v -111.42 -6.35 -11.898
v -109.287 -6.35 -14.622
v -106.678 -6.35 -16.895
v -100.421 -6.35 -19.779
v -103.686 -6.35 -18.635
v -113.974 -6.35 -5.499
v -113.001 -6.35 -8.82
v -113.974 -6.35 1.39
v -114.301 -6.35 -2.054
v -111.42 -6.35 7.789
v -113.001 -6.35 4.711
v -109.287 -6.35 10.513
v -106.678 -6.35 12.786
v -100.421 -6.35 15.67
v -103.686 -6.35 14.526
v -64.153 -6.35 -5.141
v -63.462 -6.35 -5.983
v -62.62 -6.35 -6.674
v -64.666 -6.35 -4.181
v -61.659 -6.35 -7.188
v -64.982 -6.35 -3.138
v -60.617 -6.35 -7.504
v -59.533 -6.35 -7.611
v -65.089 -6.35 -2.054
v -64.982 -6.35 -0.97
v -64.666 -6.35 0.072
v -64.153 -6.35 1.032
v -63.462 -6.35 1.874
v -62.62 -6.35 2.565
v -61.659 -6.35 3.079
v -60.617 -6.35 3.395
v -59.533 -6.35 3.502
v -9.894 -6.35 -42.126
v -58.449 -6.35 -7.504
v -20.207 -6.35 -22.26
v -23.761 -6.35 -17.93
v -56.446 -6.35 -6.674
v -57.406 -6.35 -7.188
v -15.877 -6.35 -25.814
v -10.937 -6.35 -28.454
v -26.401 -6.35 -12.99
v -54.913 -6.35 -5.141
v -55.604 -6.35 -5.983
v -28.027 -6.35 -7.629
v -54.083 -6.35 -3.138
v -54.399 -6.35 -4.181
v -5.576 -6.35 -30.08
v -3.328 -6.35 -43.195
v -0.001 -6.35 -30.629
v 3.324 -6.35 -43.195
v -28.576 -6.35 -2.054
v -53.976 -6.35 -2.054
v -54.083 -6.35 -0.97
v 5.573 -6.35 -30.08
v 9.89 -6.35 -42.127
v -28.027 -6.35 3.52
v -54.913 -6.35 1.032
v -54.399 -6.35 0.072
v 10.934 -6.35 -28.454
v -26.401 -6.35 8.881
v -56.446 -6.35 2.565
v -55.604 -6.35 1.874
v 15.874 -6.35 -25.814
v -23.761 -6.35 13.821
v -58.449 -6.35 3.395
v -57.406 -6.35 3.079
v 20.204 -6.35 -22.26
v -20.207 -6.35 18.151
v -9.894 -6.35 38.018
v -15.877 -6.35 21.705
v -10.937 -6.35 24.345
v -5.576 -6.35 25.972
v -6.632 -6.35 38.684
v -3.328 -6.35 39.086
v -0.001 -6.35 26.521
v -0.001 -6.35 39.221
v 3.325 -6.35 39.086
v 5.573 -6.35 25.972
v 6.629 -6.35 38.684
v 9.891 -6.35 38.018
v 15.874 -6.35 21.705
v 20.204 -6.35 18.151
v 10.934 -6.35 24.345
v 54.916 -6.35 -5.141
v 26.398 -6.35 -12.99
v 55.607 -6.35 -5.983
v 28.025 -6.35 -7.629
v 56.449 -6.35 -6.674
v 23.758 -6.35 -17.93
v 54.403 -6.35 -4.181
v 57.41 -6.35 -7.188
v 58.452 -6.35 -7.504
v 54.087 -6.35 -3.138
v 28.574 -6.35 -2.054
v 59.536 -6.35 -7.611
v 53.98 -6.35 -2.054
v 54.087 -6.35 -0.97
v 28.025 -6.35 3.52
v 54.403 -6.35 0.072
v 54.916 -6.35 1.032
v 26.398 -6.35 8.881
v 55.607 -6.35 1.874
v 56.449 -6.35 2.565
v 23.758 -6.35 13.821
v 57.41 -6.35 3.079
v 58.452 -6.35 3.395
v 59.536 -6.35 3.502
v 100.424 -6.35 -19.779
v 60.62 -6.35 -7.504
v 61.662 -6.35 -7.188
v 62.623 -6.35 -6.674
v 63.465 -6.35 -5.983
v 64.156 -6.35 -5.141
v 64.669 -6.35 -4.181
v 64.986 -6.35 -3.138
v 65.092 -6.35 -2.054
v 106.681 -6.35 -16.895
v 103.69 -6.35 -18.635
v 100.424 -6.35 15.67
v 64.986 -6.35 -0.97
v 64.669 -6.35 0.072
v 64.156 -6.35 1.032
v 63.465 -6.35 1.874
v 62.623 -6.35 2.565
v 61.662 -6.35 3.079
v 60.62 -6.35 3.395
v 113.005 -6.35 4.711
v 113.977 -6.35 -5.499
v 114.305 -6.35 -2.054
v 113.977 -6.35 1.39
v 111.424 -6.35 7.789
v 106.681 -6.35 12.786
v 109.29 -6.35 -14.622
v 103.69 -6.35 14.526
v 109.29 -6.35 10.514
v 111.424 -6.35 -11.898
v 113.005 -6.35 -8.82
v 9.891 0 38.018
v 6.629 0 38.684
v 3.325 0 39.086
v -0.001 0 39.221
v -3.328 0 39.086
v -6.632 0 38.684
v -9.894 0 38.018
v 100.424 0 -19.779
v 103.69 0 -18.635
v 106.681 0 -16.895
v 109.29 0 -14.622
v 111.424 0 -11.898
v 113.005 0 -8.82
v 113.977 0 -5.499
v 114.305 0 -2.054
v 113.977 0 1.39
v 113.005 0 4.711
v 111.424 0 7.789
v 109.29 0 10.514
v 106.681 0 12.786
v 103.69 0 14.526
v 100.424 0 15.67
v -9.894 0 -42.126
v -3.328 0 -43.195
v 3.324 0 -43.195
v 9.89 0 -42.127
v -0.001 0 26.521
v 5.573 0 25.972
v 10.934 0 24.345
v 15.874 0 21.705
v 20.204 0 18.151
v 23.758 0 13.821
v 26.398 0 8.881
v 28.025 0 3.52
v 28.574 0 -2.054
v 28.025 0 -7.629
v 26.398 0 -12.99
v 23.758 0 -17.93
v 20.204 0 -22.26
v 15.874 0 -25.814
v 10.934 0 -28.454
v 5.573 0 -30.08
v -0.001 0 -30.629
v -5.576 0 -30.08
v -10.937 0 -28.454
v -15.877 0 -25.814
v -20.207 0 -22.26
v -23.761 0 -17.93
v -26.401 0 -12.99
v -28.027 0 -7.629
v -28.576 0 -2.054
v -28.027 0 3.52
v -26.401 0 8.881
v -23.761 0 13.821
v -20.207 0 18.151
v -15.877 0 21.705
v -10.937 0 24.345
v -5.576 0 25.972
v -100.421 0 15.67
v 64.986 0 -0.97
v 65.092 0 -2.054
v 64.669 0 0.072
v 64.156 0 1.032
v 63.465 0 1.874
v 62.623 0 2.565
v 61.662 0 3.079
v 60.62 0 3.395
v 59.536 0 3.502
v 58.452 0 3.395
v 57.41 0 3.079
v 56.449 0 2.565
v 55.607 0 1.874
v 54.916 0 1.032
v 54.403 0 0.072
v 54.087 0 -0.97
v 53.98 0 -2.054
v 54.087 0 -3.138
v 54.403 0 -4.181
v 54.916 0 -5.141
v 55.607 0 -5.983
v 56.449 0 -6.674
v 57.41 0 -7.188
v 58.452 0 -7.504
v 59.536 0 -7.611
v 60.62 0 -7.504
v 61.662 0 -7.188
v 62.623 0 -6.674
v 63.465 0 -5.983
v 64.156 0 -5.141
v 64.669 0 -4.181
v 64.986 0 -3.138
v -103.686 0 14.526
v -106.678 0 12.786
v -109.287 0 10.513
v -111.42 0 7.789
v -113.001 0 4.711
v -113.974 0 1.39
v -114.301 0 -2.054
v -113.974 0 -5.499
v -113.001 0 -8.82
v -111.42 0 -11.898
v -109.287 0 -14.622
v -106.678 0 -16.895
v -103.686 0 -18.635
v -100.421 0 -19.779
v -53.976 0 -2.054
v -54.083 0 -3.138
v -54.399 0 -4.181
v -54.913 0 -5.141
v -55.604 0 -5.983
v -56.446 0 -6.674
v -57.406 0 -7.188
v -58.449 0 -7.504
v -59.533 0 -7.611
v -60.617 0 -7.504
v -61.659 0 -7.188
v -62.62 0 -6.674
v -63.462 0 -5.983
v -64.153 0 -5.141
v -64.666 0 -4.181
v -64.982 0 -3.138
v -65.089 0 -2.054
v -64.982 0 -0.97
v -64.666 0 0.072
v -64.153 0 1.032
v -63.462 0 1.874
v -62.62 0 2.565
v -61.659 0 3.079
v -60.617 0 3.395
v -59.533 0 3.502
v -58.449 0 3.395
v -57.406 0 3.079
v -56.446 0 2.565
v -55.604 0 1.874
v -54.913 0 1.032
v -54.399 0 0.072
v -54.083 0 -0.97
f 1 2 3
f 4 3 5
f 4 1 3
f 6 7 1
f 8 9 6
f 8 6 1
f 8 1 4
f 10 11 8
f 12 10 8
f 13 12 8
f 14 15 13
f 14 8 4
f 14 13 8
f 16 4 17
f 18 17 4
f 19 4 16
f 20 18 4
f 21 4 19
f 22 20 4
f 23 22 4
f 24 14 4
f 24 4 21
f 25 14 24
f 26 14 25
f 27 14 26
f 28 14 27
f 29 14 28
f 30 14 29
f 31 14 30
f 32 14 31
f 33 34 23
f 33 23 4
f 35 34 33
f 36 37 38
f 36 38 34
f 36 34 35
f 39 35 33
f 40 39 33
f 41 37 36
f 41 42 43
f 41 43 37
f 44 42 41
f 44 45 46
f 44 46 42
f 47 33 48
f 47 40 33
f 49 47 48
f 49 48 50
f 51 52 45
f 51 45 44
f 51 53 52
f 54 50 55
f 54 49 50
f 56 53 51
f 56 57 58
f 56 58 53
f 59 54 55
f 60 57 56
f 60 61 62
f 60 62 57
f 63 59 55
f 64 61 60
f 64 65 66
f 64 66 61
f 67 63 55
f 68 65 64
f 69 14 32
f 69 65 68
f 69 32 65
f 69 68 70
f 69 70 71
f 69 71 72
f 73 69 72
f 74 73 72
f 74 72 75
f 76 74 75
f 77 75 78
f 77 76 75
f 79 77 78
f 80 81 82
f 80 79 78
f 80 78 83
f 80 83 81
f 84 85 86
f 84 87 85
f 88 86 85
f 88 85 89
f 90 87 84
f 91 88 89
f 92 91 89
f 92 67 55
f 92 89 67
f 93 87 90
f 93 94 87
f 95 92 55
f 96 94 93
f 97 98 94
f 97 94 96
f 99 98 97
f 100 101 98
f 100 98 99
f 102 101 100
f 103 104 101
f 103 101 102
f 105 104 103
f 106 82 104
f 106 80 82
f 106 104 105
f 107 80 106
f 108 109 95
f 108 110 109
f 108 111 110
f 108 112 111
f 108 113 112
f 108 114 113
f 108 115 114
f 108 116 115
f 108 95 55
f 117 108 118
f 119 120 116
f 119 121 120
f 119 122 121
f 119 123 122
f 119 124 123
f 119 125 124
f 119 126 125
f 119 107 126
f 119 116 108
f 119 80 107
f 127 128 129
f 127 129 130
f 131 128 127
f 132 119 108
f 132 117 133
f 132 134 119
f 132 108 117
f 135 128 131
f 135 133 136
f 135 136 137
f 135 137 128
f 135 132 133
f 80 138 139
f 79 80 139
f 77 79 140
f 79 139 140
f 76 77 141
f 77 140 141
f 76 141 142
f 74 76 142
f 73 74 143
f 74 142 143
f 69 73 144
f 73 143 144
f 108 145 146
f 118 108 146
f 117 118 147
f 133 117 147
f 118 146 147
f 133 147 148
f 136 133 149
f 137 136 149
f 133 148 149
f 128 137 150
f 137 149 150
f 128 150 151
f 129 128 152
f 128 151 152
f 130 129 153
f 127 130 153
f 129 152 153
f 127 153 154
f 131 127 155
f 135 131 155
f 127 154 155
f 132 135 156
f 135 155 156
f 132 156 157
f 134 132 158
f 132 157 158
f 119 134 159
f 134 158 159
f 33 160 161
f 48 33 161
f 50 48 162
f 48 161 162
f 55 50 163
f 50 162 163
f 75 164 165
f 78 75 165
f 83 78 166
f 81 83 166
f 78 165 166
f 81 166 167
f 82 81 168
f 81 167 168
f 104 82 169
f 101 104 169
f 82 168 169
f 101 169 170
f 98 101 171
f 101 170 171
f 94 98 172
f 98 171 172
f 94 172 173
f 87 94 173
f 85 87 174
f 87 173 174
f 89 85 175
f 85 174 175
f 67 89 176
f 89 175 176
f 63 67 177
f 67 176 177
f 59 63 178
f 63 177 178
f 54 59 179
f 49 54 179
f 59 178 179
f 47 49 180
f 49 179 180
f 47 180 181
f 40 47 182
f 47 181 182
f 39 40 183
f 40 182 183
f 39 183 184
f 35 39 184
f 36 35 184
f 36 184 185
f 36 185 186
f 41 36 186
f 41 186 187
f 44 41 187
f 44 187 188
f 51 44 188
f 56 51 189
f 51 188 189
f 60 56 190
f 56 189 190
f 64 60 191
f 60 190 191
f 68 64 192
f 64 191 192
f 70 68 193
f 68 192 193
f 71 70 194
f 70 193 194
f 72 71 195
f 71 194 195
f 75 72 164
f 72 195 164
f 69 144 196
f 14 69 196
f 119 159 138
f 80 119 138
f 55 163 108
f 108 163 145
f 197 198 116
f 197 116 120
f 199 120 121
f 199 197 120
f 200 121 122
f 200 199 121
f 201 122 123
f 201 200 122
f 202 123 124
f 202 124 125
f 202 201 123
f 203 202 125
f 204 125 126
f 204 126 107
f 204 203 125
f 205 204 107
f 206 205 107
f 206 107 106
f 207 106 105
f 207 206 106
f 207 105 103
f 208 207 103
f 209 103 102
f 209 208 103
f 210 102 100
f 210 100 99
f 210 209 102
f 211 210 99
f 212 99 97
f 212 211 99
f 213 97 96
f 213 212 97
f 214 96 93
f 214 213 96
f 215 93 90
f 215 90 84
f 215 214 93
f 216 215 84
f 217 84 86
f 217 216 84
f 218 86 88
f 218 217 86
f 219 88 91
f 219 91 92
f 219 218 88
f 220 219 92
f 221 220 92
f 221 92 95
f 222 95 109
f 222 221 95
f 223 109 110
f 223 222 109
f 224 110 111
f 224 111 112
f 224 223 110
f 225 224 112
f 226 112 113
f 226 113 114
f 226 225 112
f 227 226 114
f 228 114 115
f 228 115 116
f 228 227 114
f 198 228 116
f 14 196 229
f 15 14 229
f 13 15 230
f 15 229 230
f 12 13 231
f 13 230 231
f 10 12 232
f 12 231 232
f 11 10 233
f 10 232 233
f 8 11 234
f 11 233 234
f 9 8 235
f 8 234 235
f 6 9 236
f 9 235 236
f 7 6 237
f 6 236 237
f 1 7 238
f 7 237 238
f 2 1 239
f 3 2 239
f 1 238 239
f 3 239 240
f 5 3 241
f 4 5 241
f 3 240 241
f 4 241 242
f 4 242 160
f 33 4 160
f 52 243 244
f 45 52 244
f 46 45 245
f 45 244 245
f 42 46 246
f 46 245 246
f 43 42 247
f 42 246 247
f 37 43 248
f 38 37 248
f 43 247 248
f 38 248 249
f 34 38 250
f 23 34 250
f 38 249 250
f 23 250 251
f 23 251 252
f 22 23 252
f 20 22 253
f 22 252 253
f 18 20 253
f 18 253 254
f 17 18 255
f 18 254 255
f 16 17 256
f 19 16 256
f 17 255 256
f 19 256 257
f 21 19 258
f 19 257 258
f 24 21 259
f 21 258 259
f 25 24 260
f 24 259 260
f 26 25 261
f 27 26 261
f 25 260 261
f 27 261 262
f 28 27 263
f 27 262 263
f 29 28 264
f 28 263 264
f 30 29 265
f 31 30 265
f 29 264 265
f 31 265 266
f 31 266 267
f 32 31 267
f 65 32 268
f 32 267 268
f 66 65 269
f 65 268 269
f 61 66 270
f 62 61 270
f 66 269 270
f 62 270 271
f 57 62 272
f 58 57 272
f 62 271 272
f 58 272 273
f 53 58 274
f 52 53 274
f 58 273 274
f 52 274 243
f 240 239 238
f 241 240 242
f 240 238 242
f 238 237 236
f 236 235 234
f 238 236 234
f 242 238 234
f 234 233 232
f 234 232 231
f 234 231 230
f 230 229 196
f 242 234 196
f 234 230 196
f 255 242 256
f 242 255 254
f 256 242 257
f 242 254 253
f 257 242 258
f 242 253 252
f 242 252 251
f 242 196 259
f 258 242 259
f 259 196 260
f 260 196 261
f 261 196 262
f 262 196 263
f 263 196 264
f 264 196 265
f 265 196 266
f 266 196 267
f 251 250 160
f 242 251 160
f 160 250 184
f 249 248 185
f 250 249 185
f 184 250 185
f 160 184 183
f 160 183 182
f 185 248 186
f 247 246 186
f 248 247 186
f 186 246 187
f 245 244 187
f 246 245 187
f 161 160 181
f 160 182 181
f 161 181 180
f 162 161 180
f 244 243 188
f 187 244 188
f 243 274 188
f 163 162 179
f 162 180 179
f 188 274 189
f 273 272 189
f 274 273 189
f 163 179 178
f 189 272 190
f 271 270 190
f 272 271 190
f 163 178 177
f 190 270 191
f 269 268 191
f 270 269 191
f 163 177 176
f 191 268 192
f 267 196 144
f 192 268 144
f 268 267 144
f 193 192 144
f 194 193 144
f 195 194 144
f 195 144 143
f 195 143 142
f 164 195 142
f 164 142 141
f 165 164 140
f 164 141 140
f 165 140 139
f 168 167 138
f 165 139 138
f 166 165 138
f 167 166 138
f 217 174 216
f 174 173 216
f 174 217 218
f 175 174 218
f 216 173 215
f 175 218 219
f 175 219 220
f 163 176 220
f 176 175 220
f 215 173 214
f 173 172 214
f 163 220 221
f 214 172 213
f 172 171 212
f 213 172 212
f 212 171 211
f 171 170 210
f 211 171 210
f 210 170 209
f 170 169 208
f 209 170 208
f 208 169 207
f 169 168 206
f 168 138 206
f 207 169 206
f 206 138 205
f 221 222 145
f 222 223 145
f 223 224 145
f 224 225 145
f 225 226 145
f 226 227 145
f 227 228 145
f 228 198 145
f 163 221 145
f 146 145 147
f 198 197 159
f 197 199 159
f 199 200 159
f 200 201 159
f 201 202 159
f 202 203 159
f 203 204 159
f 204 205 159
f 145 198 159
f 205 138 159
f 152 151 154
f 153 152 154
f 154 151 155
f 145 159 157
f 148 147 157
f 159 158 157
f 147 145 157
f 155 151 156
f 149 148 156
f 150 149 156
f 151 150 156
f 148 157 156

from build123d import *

# Parameters (mm, degrees)
F0_R     = 5.55625
F1_DEPTH = 6.35


with BuildPart() as f1:
    # F0 (on Front) → F1 (new body)
    with BuildSketch(Plane.XZ):
        with BuildLine():
            ThreePointArc((9.890924, 38.017616), (4.981184, 38.918746), (-0.001432, 39.220595))
            ThreePointArc((-0.001432, 39.220595), (-4.984048, 38.918746), (-9.893787, 38.017616))
            Line((-9.893787, 38.017616), (-100.420647, 15.669758))
            ThreePointArc((-100.420647, 15.669758), (-114.301432, -2.054405), (-100.420647, -19.778569))
            Line((-100.420647, -19.778569), (-9.893787, -42.126427))
            ThreePointArc((-9.893787, -42.126427), (-0.001769, -43.329405), (9.89027, -42.126589))
            Line((9.89027, -42.126589), (100.423844, -19.77864))
            ThreePointArc((100.423844, -19.77864), (114.304918, -2.054405), (100.423844, 15.669829))
            Line((100.423844, 15.669829), (9.890924, 38.017616))
        make_face()
        with BuildLine():
            ThreePointArc((-65.088932, -2.054405), (-59.532682, 3.501845), (-53.976432, -2.054405))
            ThreePointArc((-53.976432, -2.054405), (-59.532682, -7.610655), (-65.088932, -2.054405))
        make_face(mode=Mode.SUBTRACT)
        with BuildLine():
            ThreePointArc((-0.001432, 26.520595), (20.204145, 18.151171), (28.573568, -2.054405))
            ThreePointArc((28.573568, -2.054405), (-20.207008, -22.259982), (-0.001432, 26.520595))
        make_face(mode=Mode.SUBTRACT)
        with Locations((59.536168, -2.054405)):
            Circle(F0_R, mode=Mode.SUBTRACT)
    extrude(amount=F1_DEPTH)


solid = f1.part
